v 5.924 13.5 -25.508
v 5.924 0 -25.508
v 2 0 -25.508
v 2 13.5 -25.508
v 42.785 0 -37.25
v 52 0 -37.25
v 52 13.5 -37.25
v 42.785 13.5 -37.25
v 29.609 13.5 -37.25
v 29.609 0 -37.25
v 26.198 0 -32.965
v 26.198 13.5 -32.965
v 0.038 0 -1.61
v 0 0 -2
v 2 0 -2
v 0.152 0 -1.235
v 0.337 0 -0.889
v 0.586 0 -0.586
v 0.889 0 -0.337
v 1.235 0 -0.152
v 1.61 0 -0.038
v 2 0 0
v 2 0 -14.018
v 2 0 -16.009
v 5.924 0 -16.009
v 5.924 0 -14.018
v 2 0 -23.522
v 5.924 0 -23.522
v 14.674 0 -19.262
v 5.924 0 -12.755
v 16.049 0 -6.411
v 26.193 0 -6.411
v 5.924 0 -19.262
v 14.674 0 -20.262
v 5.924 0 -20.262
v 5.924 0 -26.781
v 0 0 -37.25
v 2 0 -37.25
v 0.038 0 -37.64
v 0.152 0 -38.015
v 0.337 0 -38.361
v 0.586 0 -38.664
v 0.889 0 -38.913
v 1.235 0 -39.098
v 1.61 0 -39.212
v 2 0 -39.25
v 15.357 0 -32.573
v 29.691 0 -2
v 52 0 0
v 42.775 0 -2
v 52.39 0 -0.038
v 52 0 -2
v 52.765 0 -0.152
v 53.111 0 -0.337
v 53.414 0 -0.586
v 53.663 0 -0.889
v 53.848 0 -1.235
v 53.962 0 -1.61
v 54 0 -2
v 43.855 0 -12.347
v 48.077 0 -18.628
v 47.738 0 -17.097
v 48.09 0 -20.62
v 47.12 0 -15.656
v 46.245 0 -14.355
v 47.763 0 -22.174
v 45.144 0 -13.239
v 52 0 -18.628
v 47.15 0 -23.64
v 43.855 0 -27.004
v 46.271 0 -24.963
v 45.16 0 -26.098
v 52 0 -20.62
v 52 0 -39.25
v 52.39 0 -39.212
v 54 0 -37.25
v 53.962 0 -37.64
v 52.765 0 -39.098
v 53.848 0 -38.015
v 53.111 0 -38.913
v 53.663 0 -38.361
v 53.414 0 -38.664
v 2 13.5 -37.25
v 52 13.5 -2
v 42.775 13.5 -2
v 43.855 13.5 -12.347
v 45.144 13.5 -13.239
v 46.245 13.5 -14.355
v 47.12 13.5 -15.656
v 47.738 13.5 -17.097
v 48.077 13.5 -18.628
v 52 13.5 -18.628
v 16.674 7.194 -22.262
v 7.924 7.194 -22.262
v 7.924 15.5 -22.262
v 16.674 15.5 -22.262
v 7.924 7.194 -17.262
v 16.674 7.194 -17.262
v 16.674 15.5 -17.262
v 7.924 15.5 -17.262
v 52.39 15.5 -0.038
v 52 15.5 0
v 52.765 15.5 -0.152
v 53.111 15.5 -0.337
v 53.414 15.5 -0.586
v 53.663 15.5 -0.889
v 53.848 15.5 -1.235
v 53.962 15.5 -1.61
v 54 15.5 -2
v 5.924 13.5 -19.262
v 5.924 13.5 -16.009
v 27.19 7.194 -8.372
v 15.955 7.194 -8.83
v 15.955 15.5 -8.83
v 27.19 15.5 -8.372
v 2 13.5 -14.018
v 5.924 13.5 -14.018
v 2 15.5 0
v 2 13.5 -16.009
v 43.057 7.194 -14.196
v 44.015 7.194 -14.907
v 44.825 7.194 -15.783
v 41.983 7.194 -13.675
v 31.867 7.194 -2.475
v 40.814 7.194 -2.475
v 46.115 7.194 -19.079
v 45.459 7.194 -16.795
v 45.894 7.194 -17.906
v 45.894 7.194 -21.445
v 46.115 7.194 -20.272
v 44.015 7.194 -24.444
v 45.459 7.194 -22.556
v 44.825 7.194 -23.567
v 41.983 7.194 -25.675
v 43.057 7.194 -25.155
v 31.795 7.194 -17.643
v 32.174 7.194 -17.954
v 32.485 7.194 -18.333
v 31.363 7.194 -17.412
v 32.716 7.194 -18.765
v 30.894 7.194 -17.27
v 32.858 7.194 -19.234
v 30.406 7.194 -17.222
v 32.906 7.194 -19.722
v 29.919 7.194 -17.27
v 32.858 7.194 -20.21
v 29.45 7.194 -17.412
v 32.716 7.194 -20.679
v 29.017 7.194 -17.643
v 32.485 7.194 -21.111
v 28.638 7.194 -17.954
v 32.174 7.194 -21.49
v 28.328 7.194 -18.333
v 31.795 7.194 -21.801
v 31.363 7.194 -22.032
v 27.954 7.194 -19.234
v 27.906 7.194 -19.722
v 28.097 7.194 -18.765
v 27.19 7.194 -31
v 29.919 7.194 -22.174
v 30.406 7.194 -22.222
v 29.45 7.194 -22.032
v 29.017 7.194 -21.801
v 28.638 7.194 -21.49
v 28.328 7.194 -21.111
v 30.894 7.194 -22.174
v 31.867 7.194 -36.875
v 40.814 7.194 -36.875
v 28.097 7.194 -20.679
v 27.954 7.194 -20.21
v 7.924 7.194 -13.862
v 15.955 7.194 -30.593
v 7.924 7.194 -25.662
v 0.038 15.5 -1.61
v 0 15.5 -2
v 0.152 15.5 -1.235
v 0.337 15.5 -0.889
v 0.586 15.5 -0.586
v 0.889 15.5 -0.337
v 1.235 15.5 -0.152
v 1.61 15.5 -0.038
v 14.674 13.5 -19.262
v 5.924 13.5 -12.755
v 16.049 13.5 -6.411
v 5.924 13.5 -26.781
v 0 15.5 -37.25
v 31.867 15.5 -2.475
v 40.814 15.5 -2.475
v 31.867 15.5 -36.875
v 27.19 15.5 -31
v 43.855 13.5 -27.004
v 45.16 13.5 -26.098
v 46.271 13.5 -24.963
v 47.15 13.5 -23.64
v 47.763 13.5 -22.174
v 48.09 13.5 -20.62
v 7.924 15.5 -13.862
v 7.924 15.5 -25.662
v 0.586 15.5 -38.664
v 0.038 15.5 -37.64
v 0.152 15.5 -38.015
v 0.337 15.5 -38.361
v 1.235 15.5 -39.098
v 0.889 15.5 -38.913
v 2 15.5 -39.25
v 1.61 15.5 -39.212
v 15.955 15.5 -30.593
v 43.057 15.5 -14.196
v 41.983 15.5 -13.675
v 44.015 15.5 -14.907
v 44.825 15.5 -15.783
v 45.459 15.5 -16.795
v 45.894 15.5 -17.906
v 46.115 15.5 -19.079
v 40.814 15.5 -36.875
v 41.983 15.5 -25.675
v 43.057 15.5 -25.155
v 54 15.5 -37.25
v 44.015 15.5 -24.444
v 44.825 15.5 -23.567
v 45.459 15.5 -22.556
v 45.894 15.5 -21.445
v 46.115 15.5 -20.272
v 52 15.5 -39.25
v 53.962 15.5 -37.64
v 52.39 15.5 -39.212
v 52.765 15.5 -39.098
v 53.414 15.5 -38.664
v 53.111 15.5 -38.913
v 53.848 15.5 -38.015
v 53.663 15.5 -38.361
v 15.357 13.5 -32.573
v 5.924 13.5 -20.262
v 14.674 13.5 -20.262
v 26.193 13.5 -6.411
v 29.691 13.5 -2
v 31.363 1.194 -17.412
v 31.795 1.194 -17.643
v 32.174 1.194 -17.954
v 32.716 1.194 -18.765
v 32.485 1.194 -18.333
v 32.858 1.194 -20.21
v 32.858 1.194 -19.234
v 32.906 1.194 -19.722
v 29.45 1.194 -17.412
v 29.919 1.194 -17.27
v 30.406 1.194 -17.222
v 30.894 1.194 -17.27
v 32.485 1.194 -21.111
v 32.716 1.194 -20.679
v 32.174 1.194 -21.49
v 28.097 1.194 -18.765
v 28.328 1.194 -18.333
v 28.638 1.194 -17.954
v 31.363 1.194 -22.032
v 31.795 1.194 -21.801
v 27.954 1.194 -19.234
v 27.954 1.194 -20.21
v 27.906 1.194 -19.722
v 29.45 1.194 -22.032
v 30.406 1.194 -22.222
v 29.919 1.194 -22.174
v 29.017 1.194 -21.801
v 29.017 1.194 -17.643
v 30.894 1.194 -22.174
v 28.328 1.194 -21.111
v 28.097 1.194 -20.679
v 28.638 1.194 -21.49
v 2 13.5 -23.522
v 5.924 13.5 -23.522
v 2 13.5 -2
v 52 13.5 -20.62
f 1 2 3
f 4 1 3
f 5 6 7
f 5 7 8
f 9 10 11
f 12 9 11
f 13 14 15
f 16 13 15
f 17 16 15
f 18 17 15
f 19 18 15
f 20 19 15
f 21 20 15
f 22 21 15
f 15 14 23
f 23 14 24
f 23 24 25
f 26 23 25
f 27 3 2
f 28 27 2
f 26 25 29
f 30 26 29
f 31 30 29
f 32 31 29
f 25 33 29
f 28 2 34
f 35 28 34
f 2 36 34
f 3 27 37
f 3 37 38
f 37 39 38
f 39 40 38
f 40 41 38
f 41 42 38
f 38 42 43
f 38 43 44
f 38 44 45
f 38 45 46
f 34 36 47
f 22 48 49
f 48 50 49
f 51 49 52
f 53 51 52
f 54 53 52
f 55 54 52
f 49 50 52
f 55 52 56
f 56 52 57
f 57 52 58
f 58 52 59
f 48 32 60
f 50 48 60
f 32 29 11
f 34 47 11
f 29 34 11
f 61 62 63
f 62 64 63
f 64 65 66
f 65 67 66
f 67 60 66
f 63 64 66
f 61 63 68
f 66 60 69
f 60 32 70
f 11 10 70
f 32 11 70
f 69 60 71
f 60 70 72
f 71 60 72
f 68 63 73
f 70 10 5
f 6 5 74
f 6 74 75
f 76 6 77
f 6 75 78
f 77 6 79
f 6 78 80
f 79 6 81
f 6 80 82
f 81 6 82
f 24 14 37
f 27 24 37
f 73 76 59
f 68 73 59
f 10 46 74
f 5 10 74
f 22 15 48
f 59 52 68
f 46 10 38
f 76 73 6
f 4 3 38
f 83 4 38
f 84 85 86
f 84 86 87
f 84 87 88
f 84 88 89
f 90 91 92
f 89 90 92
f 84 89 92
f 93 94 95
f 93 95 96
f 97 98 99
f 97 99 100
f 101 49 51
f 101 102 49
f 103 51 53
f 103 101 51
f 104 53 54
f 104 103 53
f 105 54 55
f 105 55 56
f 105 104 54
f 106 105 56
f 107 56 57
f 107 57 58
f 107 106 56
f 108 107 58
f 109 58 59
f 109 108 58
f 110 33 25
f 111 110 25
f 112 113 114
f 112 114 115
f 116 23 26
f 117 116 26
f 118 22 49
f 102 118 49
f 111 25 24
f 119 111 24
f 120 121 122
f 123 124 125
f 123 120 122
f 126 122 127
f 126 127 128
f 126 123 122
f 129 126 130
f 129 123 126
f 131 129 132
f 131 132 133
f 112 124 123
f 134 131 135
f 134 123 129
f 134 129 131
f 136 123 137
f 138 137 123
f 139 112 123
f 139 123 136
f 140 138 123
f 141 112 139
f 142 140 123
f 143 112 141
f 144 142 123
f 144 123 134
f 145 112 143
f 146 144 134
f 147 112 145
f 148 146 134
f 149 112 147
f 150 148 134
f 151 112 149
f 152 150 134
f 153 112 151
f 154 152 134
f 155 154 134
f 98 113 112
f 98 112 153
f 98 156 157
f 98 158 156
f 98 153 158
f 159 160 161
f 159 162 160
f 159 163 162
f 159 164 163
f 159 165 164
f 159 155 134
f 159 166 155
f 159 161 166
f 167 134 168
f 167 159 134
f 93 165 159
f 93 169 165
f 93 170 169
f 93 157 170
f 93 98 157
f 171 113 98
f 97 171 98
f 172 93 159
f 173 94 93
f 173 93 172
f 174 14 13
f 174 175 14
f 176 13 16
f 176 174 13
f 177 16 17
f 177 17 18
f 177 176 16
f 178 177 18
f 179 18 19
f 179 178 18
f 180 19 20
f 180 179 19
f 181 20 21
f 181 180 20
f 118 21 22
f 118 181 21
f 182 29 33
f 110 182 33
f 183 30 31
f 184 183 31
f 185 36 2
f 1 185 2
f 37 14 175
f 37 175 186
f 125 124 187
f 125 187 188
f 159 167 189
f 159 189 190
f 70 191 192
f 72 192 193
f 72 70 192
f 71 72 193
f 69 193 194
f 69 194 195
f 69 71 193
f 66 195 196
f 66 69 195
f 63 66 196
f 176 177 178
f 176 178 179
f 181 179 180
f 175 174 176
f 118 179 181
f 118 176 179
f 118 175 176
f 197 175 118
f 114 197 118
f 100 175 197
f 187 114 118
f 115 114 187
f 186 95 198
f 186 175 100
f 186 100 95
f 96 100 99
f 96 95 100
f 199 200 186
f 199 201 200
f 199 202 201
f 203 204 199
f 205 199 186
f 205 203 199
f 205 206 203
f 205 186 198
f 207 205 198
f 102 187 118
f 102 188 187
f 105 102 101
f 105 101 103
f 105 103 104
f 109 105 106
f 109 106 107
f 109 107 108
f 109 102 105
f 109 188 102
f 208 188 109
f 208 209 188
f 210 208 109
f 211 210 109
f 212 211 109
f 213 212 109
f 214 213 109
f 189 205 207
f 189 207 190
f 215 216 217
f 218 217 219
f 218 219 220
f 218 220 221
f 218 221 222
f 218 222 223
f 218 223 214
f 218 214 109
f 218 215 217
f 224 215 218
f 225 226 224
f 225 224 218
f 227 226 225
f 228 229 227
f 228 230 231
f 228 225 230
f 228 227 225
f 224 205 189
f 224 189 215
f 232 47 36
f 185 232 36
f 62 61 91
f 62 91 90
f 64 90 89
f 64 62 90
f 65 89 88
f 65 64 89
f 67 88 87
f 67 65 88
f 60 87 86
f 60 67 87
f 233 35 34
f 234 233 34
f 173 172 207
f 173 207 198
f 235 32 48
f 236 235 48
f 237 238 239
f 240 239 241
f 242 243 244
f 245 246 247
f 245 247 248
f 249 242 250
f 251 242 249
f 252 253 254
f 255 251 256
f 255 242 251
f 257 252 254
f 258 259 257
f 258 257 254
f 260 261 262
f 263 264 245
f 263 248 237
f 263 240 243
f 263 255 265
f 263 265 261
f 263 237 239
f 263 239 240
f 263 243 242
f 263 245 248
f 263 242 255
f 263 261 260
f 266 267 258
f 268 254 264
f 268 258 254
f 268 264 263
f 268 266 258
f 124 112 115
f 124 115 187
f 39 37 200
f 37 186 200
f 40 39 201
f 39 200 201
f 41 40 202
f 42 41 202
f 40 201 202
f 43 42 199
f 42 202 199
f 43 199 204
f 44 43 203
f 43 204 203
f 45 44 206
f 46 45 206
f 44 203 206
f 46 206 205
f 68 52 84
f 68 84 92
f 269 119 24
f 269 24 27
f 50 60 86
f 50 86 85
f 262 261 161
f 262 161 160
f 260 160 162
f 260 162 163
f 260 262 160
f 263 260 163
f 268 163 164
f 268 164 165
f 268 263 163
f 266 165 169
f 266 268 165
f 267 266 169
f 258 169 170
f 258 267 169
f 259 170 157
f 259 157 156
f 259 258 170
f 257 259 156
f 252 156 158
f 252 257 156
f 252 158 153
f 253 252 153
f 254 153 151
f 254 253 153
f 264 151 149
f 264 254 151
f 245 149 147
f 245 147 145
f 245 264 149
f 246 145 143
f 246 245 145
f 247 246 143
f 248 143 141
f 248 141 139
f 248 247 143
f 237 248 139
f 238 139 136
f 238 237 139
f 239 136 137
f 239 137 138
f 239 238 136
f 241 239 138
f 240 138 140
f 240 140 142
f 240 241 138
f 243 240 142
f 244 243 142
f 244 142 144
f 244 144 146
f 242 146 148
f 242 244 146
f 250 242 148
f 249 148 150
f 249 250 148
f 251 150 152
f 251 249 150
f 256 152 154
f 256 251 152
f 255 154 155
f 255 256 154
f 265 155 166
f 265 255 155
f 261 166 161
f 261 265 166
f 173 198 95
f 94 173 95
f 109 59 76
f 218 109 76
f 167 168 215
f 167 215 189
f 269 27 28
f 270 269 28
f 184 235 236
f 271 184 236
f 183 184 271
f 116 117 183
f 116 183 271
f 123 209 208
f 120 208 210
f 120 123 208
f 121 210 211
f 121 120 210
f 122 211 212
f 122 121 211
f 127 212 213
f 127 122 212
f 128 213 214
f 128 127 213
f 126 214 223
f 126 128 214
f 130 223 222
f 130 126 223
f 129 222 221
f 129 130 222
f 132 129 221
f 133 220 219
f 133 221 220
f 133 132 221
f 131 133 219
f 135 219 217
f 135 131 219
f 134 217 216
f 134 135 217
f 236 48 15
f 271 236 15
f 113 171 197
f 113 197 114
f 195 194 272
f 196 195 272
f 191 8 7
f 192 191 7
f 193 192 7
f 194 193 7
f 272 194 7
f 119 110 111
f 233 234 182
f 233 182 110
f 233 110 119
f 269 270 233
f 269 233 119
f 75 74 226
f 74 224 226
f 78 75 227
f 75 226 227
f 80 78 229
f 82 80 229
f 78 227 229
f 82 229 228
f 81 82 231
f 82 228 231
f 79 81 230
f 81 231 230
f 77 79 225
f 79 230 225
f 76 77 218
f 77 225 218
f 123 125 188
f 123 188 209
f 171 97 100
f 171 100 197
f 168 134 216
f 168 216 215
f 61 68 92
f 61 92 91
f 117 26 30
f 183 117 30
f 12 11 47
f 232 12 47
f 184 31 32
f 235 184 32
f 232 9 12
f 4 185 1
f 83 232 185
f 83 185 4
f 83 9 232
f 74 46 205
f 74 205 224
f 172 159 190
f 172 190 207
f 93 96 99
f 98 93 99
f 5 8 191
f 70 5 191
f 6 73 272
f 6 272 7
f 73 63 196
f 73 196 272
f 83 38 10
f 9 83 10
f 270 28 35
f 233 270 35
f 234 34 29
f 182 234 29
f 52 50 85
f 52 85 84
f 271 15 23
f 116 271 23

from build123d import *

# Parameters (mm, degrees)
SKETCH1_W              = 54
SKETCH1_H              = 39.25
BOSS_EXTRUDE1_DEPTH    = 15.5
FILLET1_R              = 2
FILLET2_R              = 2
M3_A_START             = -3.329776532
M3_A_BLANK_DEPTH       = 9
M3_A_START_2           = -9.329776532
M3_A_BLANK_2_OUTLINE_R = 2.5
M3_A_BLANK_2_DEPTH     = 6
BODY_MOVE_COPY6_ANGLE  = 90
CUT_EXTRUDE1_DEPTH     = 13.5


with BuildPart() as part:
    # Sketch1 → Boss-Extrude1 (new body)
    with BuildSketch(Plane(origin=(0, 0, 0), x_dir=(1, 0, 0), z_dir=(0, 1, 0))):
        with Locations((27, 19.625)):
            Rectangle(SKETCH1_W, SKETCH1_H)
    extrude(amount=BOSS_EXTRUDE1_DEPTH)

    # Fillet1
    fillet1_edges = [part.edges().sort_by_distance(p)[0] for p in [
        (0, 7.75, 0),
    ]]
    fillet(fillet1_edges, radius=FILLET1_R)

    # Fillet2
    fillet2_edges = [part.edges().sort_by_distance(p)[0] for p in [
        (0, 7.75, -39.25),
        (54, 7.75, -39.25),
        (54, 7.75, 0),
    ]]
    fillet(fillet2_edges, radius=FILLET2_R)


with BuildPart() as body_2:
    # M3-A Blank: read off the stored shape, not the designer's step
    # M3-A Blank outline → M3-A Blank (new body)
    with BuildSketch(Plane(origin=(0, 0, 0), x_dir=(1, 0, 0), z_dir=(0, 1, 0)).offset(M3_A_START)):
        with BuildLine():
            Line((-41.581939277, 43.861919588), (-30.381939277, 42.692718591))
            ThreePointArc((-30.381939277, 42.692718591), (-24.381939277, 38.532817401), (-18.381939277, 42.692718591))
            Line((-18.381939277, 42.692718591), (-7.181939277, 43.861919588))
            Line((-7.181939277, 43.861919588), (-7.181939277, 52.808848959))
            Line((-7.181939277, 52.808848959), (-13.057281533, 57.485652948))
            Line((-13.057281533, 57.485652948), (-13.463960141, 68.720149487))
            Line((-13.463960141, 68.720149487), (-18.39493826, 76.75205199))
            Line((-18.39493826, 76.75205199), (-21.79493826, 76.75205199))
            Line((-21.79493826, 76.75205199), (-21.79493826, 68.00205199))
            Line((-21.79493826, 68.00205199), (-26.79493826, 68.00205199))
            Line((-26.79493826, 68.00205199), (-26.79493826, 76.75205199))
            Line((-26.79493826, 76.75205199), (-30.19493826, 76.75205199))
            Line((-30.19493826, 76.75205199), (-35.227586031, 68.720149487))
            Line((-35.227586031, 68.720149487), (-35.685099465, 57.485652948))
            Line((-35.685099465, 57.485652948), (-41.581939277, 52.808848959))
            Line((-41.581939277, 52.808848959), (-41.581939277, 43.861919588))
        make_face()
    extrude(amount=M3_A_BLANK_DEPTH)

    # M3-A Blank 2 outline → M3-A Blank 2 (add)
    with BuildSketch(Plane(origin=(0, 0, 0), x_dir=(1, 0, 0), z_dir=(0, 1, 0)).offset(M3_A_START_2)):
        with Locations((-24.335480832, 54.269355582)):
            Circle(M3_A_BLANK_2_OUTLINE_R)
    extrude(amount=M3_A_BLANK_2_DEPTH)


with BuildPart() as body_2_1:
    # Body-Move/Copy4: moved
    add(body_2.part.moved(Location((42.5, 8.919688157, 37.96700657))))


with BuildPart() as body_2_2:
    # Body-Move/Copy5: moved
    add(body_2_1.part.moved(Location((8.915108254, 0, 0))))


with BuildPart() as body_2_3:
    # Body-Move/Copy6: moved
    add(body_2_2.part.rotate(Axis((27.033168977, 0, -19.675428126), (0, 1, 0)), BODY_MOVE_COPY6_ANGLE))


with BuildPart() as body_2_4:
    # Body-Move/Copy7: moved
    add(body_2_3.part.moved(Location((0, 1.103676274, 0))))


with BuildPart() as body_2_5:
    # Body-Move/Copy8: moved
    add(body_2_4.part.moved(Location((0, 0.5, 0))))


with BuildPart() as part_1:
    add(part.part)

    # Intersect1: read off the stored shape, not the designer's step
    # Intersect1: cut body 2
    add(body_2_5.part, mode=Mode.SUBTRACT)

    # Sketch3 → Cut-Extrude1 (cut)
    with BuildSketch(Plane(origin=(0, 0, 0), x_dir=(-1, 0, 0), z_dir=(0, -1, 0))):
        Polygon((-5.923551682, 12.755419679), (-16.048628272, 6.41122612), (-26.192603819, 6.41122612), (-29.691162465, 2), (-2, 2), (-2, 14.017695962), (-5.923551682, 14.017695962), align=None)
        Polygon((-2, 37.25), (-29.60864948, 37.25), (-26.198159594, 32.965493874), (-15.357384062, 32.57306761), (-5.923551682, 26.781411023), (-5.923551682, 25.507817982), (-2, 25.507817982), align=None)
        Polygon((-5.923551682, 20.262429143), (-14.673551682, 20.262429143), (-14.673551682, 19.262429143), (-5.923551682, 19.262429143), (-5.923551682, 16.008924411), (-2, 16.008924411), (-2, 23.521920083), (-5.923551682, 23.521920083), align=None)
        with BuildLine():
            Line((-42.774921098, 2), (-52, 2))
            Line((-52, 2), (-52, 18.627764364))
            Line((-52, 18.627764364), (-48.077251764, 18.627764364))
            ThreePointArc((-48.077251764, 18.627764364), (-46.712904885, 14.985289801), (-43.85505184, 12.346778986))
            Line((-43.85505184, 12.346778986), (-42.774921098, 2))
        make_face()
        with BuildLine():
            Line((-52, 37.25), (-42.78544978, 37.25))
            Line((-42.78544978, 37.25), (-43.85505184, 27.004077266))
            ThreePointArc((-43.85505184, 27.004077266), (-46.741831066, 24.322246322), (-48.089593706, 20.619646239))
            Line((-48.089593706, 20.619646239), (-52, 20.619646239))
            Line((-52, 20.619646239), (-52, 37.25))
        make_face()
    extrude(amount=-CUT_EXTRUDE1_DEPTH, mode=Mode.SUBTRACT)


solid = part_1.part
